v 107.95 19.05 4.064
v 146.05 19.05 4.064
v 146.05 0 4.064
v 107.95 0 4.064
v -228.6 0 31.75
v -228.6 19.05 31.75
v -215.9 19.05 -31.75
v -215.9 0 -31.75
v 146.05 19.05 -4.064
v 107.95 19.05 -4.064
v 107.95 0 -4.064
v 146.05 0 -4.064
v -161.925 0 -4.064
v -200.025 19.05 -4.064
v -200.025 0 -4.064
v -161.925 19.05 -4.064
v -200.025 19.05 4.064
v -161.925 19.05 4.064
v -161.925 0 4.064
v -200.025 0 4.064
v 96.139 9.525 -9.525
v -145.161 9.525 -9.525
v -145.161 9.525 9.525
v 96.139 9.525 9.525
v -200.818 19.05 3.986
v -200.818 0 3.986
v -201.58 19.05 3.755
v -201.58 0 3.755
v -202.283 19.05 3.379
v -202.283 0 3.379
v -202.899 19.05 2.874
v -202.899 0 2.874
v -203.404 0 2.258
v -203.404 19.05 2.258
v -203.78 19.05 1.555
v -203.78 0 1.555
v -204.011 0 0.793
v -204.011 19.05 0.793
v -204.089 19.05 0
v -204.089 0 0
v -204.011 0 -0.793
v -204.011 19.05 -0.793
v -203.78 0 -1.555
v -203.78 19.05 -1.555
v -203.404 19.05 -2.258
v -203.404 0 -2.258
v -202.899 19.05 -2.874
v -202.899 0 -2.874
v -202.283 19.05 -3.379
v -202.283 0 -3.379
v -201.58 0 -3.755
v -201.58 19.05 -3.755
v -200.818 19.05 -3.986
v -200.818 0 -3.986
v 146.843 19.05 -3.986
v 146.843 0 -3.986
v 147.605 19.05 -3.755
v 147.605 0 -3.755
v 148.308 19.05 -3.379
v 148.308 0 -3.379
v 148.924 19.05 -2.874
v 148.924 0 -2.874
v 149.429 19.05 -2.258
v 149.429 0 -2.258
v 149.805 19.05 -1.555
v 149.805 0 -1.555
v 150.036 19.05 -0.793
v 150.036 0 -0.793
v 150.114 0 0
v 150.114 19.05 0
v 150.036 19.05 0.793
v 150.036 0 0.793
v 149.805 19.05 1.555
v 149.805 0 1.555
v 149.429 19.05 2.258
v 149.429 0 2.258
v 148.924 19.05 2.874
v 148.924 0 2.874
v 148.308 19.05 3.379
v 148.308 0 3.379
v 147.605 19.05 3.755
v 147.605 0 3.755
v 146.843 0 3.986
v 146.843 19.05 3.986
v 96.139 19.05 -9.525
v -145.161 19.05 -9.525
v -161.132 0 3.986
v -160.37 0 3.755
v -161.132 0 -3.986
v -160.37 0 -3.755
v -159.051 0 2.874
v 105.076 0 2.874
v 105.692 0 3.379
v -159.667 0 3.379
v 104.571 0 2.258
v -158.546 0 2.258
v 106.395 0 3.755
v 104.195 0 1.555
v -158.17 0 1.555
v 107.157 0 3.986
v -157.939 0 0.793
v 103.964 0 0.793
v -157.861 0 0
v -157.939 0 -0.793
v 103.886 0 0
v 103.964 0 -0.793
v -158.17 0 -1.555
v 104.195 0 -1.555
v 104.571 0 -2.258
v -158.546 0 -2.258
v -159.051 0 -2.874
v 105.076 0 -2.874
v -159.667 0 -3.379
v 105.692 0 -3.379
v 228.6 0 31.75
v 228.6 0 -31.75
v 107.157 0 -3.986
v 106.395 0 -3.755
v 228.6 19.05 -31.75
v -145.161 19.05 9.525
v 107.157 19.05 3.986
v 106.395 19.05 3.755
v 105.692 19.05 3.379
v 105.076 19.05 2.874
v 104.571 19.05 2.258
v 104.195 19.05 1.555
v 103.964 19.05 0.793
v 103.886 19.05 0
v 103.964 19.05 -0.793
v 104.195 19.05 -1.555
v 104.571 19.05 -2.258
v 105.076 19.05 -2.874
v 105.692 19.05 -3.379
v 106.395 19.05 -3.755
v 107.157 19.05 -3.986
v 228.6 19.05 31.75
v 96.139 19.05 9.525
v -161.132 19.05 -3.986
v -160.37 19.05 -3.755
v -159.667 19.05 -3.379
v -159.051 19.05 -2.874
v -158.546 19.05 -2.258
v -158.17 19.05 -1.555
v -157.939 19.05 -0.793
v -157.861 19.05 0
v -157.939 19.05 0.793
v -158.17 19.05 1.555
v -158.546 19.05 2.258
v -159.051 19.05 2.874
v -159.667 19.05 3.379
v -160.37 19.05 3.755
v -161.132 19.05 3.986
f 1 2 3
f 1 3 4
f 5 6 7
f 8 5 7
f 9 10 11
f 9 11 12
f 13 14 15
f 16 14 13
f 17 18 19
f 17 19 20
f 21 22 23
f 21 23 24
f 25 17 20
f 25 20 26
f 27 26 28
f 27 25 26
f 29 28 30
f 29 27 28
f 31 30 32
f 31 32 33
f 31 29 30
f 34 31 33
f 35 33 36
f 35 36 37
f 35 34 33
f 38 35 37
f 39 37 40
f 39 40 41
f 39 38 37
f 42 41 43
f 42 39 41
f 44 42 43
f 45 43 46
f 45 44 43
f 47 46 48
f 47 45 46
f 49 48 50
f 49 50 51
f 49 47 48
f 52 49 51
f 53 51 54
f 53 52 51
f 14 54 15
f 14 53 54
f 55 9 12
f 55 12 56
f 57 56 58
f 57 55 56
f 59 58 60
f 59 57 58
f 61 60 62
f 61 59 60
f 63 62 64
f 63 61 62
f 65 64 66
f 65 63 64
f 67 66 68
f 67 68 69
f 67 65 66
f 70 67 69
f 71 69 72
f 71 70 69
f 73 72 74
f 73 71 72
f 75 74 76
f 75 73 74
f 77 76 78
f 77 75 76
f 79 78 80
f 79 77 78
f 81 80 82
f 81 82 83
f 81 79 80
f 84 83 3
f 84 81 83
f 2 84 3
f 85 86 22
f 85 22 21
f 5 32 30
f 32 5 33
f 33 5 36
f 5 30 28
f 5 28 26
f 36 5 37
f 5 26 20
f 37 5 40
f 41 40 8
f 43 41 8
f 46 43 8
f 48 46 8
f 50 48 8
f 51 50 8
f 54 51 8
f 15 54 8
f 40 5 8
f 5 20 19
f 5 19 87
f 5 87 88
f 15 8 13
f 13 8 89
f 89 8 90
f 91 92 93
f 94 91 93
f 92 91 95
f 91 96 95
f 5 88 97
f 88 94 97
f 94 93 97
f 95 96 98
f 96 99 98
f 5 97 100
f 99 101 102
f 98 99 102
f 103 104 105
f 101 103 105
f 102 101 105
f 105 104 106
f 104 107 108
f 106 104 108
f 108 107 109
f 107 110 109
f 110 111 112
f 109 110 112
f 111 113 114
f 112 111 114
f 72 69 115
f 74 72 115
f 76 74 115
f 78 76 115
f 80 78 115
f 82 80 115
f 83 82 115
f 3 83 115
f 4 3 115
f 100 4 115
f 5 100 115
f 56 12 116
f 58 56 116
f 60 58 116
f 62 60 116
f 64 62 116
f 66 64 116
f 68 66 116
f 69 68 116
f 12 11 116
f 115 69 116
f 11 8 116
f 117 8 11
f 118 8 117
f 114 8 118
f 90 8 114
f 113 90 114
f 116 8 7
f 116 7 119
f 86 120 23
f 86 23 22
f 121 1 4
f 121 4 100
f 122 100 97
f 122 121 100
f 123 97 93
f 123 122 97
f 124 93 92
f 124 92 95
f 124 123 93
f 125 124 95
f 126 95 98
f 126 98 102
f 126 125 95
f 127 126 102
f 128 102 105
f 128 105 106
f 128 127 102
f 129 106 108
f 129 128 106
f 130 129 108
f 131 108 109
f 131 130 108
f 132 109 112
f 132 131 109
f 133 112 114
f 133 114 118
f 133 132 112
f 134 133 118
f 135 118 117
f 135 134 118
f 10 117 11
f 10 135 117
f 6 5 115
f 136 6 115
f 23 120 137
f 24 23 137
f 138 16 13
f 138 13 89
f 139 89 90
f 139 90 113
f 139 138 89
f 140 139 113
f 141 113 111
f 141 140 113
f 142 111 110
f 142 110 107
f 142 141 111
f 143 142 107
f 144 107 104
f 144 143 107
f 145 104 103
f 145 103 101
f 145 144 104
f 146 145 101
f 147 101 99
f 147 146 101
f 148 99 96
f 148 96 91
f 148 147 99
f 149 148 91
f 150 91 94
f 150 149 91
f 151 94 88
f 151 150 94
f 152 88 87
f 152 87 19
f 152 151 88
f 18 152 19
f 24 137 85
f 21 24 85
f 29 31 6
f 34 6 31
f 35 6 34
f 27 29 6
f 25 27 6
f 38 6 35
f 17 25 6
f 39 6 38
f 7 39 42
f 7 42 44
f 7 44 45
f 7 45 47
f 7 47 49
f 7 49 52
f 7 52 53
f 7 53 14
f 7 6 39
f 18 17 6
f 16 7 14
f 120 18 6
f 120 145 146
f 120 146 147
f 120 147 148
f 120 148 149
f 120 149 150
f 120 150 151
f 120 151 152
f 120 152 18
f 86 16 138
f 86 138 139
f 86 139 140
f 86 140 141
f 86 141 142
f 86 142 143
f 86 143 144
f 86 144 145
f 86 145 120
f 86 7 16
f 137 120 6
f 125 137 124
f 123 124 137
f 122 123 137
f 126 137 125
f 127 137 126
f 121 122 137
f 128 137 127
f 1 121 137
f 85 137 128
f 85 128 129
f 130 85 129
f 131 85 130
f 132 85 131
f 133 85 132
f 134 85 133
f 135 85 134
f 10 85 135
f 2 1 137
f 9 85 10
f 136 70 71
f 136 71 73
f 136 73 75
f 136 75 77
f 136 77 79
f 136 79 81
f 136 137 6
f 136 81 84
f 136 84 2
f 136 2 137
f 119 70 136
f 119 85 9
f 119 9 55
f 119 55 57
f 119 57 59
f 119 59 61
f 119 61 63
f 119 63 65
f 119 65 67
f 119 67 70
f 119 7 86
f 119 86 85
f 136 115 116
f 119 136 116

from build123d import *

# Parameters (mm, degrees)
SKETCH1_W           = 457.2
SKETCH1_H           = 63.5
BOSS_EXTRUDE1_DEPTH = 19.05
CUT_EXTRUDE1_DEPTH  = 19.05
CUT_EXTRUDE2_DEPTH  = 232.579198116
SKETCH5_W           = 241.3
SKETCH5_H           = 19.05
CUT_EXTRUDE3_DEPTH  = 9.525


with BuildPart() as part:
    # Sketch1 → Boss-Extrude1 (new body)
    with BuildSketch(Plane(origin=(0, 0, 0), x_dir=(1, 0, 0), z_dir=(0, 1, 0))):
        Rectangle(SKETCH1_W, SKETCH1_H)
    extrude(amount=BOSS_EXTRUDE1_DEPTH)

    # Sketch2 → Cut-Extrude1 (cut)
    with BuildSketch(Plane(origin=(0, 19.05, 0), x_dir=(1, 0, 0), z_dir=(0, 1, 0))):
        with BuildLine():
            Line((146.05, -4.064), (107.95, -4.064))
            ThreePointArc((107.95, -4.064), (103.886, 0), (107.95, 4.064))
            Line((107.95, 4.064), (146.05, 4.064))
            ThreePointArc((146.05, 4.064), (150.114, 0), (146.05, -4.064))
        make_face()
        with BuildLine():
            Line((-200.025, 4.064), (-161.925, 4.064))
            ThreePointArc((-161.925, 4.064), (-157.861, 0), (-161.925, -4.064))
            Line((-161.925, -4.064), (-200.025, -4.064))
            ThreePointArc((-200.025, -4.064), (-204.089, 0), (-200.025, 4.064))
        make_face()
    extrude(amount=-CUT_EXTRUDE1_DEPTH, mode=Mode.SUBTRACT)

    # Sketch3 → Cut-Extrude2 (cut, through all)
    with BuildSketch(Plane(origin=(0, 19.05, 0), x_dir=(1, 0, 0), z_dir=(0, 1, 0))):
        Polygon((-228.6, 31.75), (-228.6, -31.75), (-215.9, 31.75), align=None)
    extrude(amount=-CUT_EXTRUDE2_DEPTH, mode=Mode.SUBTRACT)

    # Sketch5 → Cut-Extrude3 (cut)
    with BuildSketch(Plane(origin=(0, 19.05, 0), x_dir=(1, 0, 0), z_dir=(0, 1, 0))):
        with Locations((-24.511, 0)):
            Rectangle(SKETCH5_W, SKETCH5_H)
    extrude(amount=-CUT_EXTRUDE3_DEPTH, mode=Mode.SUBTRACT)


solid = part.part
